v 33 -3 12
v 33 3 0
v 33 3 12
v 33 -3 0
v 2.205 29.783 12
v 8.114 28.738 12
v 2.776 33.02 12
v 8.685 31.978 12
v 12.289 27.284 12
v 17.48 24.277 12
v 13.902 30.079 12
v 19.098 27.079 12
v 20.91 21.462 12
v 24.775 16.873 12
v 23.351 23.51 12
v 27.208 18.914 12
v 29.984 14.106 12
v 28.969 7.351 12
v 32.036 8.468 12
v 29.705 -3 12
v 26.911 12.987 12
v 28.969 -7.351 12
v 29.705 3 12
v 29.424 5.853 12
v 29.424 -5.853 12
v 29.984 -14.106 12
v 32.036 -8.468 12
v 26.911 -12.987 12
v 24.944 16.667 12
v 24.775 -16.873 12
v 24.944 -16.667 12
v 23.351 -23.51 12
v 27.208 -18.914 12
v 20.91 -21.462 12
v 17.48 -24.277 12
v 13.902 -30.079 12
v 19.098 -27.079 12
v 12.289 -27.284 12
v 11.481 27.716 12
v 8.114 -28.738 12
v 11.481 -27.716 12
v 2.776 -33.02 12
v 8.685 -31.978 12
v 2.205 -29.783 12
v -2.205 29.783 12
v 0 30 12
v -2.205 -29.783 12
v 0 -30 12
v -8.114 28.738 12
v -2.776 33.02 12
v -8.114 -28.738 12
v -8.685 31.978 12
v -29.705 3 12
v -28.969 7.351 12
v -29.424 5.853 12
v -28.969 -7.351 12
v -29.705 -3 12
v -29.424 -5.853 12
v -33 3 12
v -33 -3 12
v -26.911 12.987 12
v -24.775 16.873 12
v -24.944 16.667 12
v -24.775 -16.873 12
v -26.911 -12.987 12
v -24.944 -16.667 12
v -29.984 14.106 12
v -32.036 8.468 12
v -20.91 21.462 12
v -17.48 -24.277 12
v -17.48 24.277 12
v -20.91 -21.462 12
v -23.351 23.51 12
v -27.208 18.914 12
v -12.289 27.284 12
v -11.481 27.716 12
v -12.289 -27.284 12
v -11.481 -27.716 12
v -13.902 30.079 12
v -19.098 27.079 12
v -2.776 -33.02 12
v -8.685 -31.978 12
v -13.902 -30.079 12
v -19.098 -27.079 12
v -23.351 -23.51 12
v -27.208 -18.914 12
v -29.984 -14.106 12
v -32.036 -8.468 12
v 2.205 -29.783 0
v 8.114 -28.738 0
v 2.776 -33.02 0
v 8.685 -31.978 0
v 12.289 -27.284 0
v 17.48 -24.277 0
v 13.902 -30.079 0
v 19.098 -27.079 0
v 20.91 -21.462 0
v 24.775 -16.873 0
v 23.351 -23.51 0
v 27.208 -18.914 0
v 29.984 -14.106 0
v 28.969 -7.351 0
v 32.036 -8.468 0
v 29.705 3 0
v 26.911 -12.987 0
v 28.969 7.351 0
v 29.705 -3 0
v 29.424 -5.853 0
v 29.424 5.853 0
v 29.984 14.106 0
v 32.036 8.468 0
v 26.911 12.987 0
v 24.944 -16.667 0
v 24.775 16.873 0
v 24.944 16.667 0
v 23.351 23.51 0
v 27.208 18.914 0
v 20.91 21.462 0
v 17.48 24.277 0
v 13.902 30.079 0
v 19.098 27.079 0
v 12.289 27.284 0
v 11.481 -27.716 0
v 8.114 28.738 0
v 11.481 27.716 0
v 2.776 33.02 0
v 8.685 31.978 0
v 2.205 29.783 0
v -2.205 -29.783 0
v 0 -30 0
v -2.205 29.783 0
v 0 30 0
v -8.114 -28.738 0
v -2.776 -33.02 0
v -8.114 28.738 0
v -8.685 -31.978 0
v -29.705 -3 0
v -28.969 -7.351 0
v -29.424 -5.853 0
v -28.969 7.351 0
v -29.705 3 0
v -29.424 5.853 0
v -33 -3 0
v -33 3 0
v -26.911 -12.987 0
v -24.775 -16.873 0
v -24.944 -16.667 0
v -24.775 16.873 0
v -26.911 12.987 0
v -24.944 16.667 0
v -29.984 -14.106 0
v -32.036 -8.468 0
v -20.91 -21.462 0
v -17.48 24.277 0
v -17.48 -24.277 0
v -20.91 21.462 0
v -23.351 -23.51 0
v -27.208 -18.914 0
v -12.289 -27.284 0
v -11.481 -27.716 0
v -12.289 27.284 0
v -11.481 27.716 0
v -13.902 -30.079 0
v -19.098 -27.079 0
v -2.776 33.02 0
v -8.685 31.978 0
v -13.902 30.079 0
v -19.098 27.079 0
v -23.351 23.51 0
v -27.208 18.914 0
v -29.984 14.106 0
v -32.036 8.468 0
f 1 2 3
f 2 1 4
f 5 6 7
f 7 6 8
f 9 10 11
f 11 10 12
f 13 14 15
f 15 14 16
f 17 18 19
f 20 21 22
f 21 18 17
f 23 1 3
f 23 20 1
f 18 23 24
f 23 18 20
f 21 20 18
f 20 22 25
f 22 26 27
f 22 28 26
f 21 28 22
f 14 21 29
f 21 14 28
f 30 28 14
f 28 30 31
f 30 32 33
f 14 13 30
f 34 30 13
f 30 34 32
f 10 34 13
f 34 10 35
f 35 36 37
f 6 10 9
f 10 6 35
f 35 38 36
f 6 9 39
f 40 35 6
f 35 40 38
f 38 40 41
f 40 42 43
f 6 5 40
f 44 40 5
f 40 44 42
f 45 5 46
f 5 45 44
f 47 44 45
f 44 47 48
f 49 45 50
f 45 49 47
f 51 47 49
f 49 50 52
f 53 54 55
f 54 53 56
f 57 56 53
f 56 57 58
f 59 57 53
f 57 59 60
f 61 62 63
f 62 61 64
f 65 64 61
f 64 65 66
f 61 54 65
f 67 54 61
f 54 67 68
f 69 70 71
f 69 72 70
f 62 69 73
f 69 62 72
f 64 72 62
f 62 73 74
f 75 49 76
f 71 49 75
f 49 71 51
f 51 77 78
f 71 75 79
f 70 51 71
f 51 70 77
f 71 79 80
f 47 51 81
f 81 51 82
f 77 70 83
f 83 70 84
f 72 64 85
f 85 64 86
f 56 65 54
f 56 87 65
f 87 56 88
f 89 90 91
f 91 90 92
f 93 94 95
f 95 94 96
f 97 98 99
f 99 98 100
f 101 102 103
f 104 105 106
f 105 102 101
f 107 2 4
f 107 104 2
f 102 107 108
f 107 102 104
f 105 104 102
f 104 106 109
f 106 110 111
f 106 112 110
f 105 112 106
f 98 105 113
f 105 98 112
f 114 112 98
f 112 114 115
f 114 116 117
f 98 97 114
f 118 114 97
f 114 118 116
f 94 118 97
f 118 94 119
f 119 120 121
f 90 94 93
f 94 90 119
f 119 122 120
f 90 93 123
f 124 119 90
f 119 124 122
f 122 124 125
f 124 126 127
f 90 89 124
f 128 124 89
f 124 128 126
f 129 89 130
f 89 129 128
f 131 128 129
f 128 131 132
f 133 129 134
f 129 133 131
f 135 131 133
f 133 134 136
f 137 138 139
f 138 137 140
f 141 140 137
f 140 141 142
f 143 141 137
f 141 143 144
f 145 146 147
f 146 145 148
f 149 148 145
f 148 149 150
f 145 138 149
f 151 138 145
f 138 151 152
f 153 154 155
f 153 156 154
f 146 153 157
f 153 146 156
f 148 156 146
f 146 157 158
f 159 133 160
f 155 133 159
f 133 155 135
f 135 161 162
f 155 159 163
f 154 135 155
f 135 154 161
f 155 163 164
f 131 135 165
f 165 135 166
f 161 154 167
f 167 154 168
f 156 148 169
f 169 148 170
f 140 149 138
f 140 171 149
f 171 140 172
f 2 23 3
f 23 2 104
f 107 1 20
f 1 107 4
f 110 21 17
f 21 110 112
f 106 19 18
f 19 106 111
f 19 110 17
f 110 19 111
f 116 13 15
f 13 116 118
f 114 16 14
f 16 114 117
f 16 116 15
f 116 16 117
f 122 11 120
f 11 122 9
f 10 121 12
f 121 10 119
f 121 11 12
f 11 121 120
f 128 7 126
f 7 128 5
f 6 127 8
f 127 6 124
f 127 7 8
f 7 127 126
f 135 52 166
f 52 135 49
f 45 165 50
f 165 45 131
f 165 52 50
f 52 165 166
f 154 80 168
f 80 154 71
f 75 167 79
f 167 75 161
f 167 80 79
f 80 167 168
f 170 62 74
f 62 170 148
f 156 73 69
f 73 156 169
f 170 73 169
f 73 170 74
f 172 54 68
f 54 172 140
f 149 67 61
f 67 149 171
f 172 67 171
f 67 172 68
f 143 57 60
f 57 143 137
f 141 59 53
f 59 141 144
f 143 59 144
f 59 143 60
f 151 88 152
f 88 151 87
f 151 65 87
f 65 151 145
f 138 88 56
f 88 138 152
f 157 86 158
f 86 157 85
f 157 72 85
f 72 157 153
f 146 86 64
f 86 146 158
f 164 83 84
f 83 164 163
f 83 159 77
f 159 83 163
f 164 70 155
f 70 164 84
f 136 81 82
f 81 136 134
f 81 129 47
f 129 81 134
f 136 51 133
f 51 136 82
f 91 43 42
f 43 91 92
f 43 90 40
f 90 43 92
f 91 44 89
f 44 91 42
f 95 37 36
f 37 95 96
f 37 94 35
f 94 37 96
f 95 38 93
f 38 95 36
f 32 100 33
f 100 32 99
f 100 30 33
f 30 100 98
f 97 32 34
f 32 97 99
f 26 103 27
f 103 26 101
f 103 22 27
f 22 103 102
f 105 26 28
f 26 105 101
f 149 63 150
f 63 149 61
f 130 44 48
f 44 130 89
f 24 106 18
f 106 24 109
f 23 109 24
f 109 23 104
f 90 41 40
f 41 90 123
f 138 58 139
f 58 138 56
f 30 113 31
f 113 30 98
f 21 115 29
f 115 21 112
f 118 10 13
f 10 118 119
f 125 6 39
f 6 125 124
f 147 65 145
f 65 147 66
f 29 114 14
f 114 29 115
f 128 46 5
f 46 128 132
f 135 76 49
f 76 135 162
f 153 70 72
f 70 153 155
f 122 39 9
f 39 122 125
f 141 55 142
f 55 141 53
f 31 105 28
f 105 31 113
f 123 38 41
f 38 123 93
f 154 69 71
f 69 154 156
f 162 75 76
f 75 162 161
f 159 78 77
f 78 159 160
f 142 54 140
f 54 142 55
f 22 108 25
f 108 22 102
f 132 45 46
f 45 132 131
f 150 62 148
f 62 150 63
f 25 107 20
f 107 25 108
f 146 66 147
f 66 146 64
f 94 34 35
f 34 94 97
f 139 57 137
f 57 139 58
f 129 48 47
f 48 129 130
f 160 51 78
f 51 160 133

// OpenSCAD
$fn = 32;

// ----------------------------------------------------------------------
// Spur blank: plain gear blank
// ----------------------------------------------------------------------

// --- parameters (mm) ---
disc_r = 30;              // blank root radius
disc_t = 12;              // blank thickness
n_teeth = 18;             // stub tooth count
tooth_w = 6;              // tooth width at the root
tooth_h = 3;              // tooth height above the root

out_r = disc_r + tooth_h;  // tip radius
bbox_x = 66.0;  // measured width over the teeth
bbox_y = 66.04;  // measured depth over the teeth

union() {
  cylinder(r = disc_r, h = disc_t);
  for (i = [0 : n_teeth - 1])
    rotate([0, 0, i * 360 / n_teeth])
      translate([disc_r - 1, -tooth_w / 2, 0])
        cube([tooth_h + 1, tooth_w, disc_t]);
}
